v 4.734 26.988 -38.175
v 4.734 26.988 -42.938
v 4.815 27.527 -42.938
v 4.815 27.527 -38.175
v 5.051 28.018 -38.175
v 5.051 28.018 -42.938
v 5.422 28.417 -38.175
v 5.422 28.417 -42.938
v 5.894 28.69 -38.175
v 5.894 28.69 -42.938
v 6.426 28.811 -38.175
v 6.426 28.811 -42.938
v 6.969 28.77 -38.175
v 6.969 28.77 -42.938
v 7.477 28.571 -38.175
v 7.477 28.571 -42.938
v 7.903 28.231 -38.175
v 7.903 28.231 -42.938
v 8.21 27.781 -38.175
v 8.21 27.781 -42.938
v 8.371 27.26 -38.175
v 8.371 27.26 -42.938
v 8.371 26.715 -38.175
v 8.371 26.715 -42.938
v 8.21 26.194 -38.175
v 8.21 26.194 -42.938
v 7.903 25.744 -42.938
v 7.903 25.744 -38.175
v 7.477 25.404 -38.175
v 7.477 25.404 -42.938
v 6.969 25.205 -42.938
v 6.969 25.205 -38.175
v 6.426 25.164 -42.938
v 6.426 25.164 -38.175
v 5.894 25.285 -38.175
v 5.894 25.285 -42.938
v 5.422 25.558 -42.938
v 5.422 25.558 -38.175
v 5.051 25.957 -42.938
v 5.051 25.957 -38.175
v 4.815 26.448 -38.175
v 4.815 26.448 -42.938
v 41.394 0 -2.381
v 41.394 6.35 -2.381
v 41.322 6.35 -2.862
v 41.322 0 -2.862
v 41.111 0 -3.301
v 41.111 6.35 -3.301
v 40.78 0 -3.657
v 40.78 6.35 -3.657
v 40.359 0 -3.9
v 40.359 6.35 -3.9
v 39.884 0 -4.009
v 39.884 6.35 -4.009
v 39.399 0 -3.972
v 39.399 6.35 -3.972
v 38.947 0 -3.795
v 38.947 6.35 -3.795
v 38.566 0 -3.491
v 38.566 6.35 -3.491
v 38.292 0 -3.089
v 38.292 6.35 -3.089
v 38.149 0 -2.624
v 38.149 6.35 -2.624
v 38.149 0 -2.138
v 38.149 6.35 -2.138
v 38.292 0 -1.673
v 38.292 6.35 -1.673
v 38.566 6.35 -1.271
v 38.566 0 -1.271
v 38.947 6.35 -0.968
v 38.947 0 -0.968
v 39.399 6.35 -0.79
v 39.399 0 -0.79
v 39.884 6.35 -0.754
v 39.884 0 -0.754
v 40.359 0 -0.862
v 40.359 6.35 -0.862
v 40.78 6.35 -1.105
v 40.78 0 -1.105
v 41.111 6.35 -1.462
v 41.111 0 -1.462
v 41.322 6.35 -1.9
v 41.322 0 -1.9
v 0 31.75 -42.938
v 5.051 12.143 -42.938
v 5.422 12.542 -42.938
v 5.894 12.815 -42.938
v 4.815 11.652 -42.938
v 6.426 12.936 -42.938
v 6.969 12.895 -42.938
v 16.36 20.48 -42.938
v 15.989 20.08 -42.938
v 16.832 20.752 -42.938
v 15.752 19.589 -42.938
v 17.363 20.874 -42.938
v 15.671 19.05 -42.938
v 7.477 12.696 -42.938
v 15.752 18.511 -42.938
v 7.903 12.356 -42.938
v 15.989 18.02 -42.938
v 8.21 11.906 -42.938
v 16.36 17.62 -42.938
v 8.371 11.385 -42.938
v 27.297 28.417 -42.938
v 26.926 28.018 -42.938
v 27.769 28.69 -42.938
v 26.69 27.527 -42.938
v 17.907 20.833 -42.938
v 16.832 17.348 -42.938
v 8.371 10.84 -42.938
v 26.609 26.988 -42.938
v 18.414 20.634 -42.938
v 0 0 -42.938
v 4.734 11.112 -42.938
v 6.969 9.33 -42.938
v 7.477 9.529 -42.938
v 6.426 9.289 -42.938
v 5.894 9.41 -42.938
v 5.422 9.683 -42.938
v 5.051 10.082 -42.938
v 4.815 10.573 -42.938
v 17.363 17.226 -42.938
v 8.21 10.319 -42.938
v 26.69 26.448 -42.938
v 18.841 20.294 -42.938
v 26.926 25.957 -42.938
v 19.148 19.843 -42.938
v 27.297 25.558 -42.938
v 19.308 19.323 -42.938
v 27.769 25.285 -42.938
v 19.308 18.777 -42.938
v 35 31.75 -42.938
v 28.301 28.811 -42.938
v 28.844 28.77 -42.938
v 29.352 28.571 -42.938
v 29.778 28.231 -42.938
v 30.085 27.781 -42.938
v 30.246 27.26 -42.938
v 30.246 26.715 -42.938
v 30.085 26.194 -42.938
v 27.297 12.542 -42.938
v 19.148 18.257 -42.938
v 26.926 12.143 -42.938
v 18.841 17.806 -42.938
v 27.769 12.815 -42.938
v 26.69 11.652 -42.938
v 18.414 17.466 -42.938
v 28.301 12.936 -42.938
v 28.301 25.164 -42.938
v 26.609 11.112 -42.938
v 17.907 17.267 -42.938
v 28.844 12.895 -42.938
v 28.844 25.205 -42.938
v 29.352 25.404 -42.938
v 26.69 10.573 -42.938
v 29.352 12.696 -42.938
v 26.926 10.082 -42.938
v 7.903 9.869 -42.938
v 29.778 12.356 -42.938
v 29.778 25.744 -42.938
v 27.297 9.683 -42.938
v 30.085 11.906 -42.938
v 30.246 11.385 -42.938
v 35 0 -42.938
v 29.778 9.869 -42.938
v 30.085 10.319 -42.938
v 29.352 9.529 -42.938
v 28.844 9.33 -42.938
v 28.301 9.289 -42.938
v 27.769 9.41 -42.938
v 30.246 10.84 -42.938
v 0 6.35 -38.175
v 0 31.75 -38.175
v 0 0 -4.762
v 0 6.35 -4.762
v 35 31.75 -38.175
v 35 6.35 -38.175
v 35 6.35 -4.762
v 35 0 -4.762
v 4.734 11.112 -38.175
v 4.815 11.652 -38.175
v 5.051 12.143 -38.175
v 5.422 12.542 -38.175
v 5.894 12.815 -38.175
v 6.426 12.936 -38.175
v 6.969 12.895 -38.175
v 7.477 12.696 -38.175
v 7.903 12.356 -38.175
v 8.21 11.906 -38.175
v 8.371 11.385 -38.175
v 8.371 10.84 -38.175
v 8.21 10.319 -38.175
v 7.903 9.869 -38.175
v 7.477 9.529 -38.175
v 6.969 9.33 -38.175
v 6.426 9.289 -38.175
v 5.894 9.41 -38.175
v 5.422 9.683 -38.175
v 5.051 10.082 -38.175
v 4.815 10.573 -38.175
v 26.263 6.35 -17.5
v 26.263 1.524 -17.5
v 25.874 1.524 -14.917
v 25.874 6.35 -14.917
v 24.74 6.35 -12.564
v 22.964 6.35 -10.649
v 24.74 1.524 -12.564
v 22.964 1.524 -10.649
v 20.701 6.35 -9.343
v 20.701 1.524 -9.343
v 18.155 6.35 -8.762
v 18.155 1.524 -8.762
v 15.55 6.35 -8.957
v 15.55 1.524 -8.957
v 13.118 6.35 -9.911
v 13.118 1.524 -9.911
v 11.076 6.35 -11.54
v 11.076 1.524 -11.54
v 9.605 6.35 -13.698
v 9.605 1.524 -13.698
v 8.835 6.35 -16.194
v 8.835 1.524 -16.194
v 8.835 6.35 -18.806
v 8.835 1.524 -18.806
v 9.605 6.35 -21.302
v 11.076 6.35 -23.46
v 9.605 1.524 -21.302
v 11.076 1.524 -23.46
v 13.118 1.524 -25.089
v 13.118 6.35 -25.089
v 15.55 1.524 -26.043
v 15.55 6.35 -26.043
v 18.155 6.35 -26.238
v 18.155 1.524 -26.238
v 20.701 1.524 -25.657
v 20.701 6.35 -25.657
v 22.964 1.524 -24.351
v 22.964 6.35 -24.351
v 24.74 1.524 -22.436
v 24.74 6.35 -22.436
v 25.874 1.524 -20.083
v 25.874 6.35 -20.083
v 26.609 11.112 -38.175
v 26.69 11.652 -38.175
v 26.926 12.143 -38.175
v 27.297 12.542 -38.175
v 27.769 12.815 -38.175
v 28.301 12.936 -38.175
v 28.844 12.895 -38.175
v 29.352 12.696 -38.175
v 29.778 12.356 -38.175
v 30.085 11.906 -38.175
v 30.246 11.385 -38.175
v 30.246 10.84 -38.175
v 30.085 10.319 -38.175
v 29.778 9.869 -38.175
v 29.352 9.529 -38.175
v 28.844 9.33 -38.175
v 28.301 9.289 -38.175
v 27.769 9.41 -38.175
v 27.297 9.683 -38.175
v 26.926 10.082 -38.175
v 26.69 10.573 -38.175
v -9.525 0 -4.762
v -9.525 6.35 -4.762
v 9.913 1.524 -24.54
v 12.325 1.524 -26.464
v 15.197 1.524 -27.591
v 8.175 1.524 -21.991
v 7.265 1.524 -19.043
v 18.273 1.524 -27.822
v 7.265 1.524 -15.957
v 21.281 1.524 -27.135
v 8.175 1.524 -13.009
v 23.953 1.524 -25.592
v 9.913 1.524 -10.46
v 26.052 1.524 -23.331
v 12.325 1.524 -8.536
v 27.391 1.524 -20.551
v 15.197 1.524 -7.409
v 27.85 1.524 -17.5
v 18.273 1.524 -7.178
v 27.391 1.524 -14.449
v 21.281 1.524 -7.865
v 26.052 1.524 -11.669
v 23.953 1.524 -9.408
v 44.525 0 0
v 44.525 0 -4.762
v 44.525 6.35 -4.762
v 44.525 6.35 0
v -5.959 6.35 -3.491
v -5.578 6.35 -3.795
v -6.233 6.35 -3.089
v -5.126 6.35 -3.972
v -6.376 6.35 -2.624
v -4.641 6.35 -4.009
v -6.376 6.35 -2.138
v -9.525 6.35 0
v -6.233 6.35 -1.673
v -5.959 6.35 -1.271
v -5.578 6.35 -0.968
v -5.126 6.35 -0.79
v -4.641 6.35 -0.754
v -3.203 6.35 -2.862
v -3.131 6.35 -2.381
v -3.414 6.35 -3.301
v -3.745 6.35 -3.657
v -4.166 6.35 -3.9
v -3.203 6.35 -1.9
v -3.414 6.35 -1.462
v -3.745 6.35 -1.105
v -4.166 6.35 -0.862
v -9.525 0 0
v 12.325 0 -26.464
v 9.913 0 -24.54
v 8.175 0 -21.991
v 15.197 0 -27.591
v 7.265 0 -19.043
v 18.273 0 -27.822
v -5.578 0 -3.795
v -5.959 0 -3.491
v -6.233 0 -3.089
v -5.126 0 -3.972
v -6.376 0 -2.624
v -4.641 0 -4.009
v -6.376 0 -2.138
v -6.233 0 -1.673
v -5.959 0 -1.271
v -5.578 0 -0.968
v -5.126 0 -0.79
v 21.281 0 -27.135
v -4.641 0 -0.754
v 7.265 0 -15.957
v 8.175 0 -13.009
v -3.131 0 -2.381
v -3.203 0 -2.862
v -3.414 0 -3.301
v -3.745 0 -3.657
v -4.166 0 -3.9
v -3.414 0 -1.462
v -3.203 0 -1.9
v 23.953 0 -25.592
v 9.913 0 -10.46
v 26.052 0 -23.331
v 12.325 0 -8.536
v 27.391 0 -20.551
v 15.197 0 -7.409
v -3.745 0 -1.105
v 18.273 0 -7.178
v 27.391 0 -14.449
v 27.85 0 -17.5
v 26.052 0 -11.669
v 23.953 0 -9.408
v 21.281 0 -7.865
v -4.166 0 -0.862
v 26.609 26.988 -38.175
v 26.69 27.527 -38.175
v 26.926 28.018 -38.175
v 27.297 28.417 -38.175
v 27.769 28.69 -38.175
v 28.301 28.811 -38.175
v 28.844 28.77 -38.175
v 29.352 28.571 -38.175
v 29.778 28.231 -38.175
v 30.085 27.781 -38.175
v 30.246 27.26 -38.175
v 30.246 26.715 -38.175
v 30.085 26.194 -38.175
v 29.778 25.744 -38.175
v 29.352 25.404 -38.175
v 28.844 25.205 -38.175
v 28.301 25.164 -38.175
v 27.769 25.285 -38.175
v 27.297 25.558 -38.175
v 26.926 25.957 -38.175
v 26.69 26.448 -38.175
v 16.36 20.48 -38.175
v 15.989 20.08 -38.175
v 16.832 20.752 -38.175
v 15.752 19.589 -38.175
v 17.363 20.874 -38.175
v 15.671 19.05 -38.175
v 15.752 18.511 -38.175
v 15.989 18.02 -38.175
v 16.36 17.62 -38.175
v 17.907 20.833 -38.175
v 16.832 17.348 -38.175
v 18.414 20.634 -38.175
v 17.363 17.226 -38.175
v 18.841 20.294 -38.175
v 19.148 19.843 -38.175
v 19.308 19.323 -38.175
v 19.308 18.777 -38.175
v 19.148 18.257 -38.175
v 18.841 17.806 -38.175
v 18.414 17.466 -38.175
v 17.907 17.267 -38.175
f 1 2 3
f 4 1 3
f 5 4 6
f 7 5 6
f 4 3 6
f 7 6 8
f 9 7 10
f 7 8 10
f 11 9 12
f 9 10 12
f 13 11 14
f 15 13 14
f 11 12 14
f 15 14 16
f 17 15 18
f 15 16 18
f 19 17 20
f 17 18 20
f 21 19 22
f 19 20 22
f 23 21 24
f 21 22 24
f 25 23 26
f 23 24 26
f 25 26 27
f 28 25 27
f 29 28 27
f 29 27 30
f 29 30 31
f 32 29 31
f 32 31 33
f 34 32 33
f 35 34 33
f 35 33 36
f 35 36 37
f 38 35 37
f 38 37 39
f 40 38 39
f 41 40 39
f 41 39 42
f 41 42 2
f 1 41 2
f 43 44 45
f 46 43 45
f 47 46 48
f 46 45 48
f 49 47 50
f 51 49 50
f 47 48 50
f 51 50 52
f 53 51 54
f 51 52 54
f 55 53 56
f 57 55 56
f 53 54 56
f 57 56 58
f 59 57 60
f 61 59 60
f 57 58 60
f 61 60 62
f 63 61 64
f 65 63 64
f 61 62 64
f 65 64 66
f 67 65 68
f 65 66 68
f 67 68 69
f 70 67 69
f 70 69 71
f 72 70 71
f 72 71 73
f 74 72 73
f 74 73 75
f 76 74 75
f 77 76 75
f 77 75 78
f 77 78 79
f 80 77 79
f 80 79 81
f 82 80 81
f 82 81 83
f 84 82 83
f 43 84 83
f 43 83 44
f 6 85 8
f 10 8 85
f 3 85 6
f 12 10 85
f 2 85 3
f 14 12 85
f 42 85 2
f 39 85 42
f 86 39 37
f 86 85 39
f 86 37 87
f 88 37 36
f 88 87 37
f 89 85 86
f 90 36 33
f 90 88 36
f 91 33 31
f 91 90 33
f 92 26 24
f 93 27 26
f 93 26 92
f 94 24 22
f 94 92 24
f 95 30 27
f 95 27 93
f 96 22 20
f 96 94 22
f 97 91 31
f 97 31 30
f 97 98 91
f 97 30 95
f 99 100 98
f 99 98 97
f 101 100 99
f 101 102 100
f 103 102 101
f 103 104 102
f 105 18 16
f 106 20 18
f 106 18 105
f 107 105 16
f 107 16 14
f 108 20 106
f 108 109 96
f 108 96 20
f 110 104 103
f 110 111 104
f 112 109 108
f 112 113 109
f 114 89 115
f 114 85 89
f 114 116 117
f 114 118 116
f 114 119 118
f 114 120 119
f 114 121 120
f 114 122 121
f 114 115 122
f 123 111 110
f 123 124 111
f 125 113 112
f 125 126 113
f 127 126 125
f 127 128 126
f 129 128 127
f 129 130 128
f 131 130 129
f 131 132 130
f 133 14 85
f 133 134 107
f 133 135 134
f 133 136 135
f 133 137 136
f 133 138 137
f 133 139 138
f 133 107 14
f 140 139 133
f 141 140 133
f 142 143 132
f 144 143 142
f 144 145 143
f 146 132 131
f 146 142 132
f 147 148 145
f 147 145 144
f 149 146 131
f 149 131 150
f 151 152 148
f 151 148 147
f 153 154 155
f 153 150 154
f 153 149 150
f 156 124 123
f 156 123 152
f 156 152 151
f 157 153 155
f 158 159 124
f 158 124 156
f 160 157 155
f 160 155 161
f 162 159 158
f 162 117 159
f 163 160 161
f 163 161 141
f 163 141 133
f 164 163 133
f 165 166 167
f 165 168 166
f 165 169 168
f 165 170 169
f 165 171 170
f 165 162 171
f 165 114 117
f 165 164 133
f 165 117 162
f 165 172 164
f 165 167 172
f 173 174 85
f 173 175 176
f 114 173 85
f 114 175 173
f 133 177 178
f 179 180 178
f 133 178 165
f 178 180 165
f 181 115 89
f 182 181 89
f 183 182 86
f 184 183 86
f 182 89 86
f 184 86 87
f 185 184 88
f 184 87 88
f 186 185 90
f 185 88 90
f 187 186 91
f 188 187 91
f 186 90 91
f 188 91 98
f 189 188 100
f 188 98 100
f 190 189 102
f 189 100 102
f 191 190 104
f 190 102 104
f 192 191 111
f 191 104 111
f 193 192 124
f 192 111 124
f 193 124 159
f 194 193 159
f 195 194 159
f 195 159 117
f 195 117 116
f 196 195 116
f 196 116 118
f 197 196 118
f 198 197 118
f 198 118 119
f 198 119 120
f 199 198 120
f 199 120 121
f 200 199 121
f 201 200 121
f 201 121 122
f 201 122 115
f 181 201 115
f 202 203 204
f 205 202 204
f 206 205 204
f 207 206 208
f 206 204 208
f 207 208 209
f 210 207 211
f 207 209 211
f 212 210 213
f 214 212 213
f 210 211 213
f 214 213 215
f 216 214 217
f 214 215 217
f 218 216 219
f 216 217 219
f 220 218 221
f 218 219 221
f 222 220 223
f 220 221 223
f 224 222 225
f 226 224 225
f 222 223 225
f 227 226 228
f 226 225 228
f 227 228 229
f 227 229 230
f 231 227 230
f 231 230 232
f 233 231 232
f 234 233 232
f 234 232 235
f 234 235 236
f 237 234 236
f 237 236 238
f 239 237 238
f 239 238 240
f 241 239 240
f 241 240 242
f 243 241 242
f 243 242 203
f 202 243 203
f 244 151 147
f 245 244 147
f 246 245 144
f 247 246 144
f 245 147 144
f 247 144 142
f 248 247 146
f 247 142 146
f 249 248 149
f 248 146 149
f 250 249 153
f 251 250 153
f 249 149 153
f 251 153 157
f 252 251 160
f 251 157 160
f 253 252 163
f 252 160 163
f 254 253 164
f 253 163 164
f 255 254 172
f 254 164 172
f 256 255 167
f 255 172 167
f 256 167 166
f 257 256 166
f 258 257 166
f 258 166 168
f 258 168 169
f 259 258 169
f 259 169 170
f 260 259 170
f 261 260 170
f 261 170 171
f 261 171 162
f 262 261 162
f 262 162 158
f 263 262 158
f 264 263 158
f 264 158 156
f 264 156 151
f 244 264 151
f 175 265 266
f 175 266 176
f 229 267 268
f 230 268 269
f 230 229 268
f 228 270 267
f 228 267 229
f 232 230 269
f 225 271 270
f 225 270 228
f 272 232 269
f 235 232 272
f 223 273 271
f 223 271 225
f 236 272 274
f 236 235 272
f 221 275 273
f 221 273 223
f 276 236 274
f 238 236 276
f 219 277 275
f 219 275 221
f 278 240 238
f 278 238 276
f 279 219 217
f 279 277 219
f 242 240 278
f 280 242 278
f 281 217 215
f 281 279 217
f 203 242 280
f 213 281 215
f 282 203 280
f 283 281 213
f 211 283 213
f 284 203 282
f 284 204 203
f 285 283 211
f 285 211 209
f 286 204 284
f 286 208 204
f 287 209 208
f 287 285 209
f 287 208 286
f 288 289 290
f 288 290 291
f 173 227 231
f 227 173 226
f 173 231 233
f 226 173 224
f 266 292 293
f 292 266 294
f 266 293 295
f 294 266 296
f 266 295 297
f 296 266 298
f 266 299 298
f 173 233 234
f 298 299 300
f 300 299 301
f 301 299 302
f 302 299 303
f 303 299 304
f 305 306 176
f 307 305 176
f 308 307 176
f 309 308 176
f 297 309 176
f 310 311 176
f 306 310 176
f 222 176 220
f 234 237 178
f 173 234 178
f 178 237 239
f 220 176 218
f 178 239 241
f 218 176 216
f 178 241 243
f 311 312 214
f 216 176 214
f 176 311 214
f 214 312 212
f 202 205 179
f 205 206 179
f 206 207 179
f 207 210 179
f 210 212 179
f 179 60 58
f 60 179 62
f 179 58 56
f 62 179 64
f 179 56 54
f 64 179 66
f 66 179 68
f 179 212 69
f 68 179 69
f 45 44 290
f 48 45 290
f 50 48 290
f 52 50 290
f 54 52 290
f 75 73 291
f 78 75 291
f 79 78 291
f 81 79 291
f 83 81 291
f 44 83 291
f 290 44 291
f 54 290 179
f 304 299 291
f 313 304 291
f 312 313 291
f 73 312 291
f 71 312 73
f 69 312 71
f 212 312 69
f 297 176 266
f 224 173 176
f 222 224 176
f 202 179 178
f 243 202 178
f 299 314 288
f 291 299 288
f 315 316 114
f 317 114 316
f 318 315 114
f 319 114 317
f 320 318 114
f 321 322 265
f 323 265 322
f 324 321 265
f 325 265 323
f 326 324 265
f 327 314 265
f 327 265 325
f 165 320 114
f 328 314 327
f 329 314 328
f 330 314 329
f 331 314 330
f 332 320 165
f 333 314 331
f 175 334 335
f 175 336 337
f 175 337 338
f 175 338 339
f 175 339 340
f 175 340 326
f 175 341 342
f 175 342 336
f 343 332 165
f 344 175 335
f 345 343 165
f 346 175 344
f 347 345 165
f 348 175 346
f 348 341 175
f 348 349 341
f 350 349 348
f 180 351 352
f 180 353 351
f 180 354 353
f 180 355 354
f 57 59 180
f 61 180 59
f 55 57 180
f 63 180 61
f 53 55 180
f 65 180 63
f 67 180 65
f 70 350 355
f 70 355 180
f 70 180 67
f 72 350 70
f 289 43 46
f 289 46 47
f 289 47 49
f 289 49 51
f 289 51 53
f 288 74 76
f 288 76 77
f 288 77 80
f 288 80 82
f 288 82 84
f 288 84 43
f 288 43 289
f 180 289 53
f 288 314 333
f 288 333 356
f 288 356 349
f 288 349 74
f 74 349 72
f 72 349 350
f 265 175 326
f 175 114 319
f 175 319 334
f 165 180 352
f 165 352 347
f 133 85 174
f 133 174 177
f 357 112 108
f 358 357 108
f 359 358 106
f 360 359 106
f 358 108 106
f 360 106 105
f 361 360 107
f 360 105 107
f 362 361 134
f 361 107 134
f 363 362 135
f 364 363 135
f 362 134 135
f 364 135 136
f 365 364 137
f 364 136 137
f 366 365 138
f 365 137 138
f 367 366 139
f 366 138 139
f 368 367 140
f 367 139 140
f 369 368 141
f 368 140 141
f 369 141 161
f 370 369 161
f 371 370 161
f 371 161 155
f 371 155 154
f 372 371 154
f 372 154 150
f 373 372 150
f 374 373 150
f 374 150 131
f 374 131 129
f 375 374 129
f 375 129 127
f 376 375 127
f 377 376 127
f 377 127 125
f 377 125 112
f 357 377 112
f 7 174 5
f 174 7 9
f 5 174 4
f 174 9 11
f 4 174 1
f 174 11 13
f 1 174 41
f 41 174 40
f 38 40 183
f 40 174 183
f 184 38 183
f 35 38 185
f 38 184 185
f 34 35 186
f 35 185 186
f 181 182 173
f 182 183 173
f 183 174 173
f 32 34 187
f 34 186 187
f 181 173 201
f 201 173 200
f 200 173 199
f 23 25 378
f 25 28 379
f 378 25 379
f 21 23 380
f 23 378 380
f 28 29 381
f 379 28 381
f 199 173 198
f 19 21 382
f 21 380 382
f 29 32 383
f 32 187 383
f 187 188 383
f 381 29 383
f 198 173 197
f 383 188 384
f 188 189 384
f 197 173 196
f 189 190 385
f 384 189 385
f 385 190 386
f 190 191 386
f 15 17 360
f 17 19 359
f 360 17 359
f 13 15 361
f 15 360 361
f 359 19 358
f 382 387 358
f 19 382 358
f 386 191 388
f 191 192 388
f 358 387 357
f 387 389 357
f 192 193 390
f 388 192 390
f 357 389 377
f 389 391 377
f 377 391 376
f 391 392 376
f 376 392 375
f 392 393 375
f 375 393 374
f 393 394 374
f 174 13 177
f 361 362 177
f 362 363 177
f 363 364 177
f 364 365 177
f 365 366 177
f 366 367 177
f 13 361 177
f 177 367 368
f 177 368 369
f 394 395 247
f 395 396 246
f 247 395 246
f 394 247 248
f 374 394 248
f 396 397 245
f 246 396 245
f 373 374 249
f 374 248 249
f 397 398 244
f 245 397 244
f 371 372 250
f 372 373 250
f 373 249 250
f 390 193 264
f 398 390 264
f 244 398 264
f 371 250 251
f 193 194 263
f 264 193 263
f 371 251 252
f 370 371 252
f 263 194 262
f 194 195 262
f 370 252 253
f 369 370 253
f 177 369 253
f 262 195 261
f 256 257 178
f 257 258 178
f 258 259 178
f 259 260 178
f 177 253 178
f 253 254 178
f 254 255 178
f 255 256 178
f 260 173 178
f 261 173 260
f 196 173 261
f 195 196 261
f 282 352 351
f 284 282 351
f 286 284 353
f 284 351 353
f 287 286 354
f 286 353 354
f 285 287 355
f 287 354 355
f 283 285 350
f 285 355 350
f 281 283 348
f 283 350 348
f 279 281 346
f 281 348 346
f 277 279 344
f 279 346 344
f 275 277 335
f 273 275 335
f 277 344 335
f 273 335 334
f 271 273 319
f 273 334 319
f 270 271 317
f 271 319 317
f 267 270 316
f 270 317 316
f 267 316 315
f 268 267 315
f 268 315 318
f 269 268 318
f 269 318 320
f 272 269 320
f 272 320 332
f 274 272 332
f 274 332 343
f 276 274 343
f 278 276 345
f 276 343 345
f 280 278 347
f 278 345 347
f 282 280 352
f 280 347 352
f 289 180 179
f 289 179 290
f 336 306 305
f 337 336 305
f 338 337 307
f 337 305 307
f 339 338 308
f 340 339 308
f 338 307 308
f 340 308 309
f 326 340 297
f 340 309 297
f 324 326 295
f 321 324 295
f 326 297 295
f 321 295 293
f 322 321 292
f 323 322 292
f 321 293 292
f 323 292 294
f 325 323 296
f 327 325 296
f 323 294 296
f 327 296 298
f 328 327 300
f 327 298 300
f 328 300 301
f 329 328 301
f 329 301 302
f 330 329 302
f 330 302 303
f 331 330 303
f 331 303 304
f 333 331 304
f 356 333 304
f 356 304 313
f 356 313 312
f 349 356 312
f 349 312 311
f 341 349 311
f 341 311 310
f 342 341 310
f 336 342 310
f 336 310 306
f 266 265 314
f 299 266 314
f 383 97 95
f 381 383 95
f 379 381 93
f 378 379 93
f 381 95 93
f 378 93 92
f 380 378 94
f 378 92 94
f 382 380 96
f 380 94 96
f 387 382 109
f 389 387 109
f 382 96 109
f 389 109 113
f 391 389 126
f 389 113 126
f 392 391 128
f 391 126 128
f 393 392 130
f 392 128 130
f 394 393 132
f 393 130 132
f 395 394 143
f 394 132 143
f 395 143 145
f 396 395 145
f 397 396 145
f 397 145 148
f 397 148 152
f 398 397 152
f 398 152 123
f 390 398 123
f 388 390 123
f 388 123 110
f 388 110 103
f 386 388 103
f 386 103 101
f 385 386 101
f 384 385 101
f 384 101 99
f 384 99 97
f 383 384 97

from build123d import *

# Parameters (mm, degrees)
SKETCH1_W                 = 35
SKETCH1_H                 = 42.9375
BOSS_EXTRUDE1_DEPTH       = 6.35
SKETCH2_W                 = 35
SKETCH2_H                 = 4.7625
BOSS_EXTRUDE2_DEPTH       = 25.4
SKETCH3_R                 = 8.763
CUT_EXTRUDE1_DEPTH        = 32.75
F_6_CLEARANCE_HOLE1_D     = 3.6576
SKETCH13_R                = 10.3505
SKETCH13_R_2              = 8.763
CUT_EXTRUDE2_DEPTH        = 1.524
SKETCH14_W                = 9.525
SKETCH14_H                = 4.7625
BOSS_EXTRUDE4_DEPTH       = 6.35
F_4_CLEARANCE_HOLE1_D     = 3.2639
F_4_CLEARANCE_HOLE1_DEPTH = 10.16
F_4_CLEARANCE_HOLE1_TIP   = 0.980574487


with BuildPart() as part:
    # Sketch1 → Boss-Extrude1 (new body)
    with BuildSketch(Plane(origin=(0, 0, 0), x_dir=(1, 0, 0), z_dir=(0, 1, 0))):
        with Locations((17.5, 21.46875)):
            Rectangle(SKETCH1_W, SKETCH1_H)
    extrude(amount=BOSS_EXTRUDE1_DEPTH)

    # Sketch2 → Boss-Extrude2 (add)
    with BuildSketch(Plane(origin=(0, 6.35, 0), x_dir=(1, 0, 0), z_dir=(0, 1, 0))):
        with Locations((17.5, 40.55625)):
            Rectangle(SKETCH2_W, SKETCH2_H)
    extrude(amount=BOSS_EXTRUDE2_DEPTH)

    # Sketch3 → Cut-Extrude1 (cut, through all)
    with BuildSketch(Plane.XZ):
        with Locations((17.5, -17.5)):
            Circle(SKETCH3_R)
    extrude(amount=-CUT_EXTRUDE1_DEPTH, mode=Mode.SUBTRACT)

    # #6 Clearance Hole1 (through all)
    with Locations(Plane.XY.offset(-38.175)):
        with Locations((6.5625, 26.9875), (17.5, 19.05), (6.5625, 11.1125), (28.4375, 26.9875), (28.4375, 11.1125)):
            Hole(F_6_CLEARANCE_HOLE1_D / 2)

    # Sketch13 → Cut-Extrude2 (cut)
    with BuildSketch(Plane.XZ):
        with Locations((17.5, -17.5)):
            Circle(SKETCH13_R)
        with Locations((17.5, -17.5)):
            Circle(SKETCH13_R_2, mode=Mode.SUBTRACT)
    extrude(amount=-CUT_EXTRUDE2_DEPTH, mode=Mode.SUBTRACT)

    # Sketch14 → Boss-Extrude4 (add)
    with BuildSketch(Plane.XZ):
        with Locations((39.7625, -2.38125)):
            Rectangle(SKETCH14_W, SKETCH14_H)
        with Locations((-4.7625, -2.38125)):
            Rectangle(SKETCH14_W, SKETCH14_H)
    extrude(amount=-BOSS_EXTRUDE4_DEPTH)

    # #4 Clearance Hole1
    with Locations(Plane(origin=(0, 0, 0), x_dir=(-1, 0, 0), z_dir=(0, -1, 0))):
        with Locations((4.7625, 2.38125), (-39.7625, 2.38125)):
            Hole(F_4_CLEARANCE_HOLE1_D / 2, depth=F_4_CLEARANCE_HOLE1_DEPTH)
            with Locations((0, 0, -(F_4_CLEARANCE_HOLE1_DEPTH + F_4_CLEARANCE_HOLE1_TIP / 2))):  # 118° drill point
                Cone(0, F_4_CLEARANCE_HOLE1_D / 2, F_4_CLEARANCE_HOLE1_TIP, mode=Mode.SUBTRACT)


solid = part.part
